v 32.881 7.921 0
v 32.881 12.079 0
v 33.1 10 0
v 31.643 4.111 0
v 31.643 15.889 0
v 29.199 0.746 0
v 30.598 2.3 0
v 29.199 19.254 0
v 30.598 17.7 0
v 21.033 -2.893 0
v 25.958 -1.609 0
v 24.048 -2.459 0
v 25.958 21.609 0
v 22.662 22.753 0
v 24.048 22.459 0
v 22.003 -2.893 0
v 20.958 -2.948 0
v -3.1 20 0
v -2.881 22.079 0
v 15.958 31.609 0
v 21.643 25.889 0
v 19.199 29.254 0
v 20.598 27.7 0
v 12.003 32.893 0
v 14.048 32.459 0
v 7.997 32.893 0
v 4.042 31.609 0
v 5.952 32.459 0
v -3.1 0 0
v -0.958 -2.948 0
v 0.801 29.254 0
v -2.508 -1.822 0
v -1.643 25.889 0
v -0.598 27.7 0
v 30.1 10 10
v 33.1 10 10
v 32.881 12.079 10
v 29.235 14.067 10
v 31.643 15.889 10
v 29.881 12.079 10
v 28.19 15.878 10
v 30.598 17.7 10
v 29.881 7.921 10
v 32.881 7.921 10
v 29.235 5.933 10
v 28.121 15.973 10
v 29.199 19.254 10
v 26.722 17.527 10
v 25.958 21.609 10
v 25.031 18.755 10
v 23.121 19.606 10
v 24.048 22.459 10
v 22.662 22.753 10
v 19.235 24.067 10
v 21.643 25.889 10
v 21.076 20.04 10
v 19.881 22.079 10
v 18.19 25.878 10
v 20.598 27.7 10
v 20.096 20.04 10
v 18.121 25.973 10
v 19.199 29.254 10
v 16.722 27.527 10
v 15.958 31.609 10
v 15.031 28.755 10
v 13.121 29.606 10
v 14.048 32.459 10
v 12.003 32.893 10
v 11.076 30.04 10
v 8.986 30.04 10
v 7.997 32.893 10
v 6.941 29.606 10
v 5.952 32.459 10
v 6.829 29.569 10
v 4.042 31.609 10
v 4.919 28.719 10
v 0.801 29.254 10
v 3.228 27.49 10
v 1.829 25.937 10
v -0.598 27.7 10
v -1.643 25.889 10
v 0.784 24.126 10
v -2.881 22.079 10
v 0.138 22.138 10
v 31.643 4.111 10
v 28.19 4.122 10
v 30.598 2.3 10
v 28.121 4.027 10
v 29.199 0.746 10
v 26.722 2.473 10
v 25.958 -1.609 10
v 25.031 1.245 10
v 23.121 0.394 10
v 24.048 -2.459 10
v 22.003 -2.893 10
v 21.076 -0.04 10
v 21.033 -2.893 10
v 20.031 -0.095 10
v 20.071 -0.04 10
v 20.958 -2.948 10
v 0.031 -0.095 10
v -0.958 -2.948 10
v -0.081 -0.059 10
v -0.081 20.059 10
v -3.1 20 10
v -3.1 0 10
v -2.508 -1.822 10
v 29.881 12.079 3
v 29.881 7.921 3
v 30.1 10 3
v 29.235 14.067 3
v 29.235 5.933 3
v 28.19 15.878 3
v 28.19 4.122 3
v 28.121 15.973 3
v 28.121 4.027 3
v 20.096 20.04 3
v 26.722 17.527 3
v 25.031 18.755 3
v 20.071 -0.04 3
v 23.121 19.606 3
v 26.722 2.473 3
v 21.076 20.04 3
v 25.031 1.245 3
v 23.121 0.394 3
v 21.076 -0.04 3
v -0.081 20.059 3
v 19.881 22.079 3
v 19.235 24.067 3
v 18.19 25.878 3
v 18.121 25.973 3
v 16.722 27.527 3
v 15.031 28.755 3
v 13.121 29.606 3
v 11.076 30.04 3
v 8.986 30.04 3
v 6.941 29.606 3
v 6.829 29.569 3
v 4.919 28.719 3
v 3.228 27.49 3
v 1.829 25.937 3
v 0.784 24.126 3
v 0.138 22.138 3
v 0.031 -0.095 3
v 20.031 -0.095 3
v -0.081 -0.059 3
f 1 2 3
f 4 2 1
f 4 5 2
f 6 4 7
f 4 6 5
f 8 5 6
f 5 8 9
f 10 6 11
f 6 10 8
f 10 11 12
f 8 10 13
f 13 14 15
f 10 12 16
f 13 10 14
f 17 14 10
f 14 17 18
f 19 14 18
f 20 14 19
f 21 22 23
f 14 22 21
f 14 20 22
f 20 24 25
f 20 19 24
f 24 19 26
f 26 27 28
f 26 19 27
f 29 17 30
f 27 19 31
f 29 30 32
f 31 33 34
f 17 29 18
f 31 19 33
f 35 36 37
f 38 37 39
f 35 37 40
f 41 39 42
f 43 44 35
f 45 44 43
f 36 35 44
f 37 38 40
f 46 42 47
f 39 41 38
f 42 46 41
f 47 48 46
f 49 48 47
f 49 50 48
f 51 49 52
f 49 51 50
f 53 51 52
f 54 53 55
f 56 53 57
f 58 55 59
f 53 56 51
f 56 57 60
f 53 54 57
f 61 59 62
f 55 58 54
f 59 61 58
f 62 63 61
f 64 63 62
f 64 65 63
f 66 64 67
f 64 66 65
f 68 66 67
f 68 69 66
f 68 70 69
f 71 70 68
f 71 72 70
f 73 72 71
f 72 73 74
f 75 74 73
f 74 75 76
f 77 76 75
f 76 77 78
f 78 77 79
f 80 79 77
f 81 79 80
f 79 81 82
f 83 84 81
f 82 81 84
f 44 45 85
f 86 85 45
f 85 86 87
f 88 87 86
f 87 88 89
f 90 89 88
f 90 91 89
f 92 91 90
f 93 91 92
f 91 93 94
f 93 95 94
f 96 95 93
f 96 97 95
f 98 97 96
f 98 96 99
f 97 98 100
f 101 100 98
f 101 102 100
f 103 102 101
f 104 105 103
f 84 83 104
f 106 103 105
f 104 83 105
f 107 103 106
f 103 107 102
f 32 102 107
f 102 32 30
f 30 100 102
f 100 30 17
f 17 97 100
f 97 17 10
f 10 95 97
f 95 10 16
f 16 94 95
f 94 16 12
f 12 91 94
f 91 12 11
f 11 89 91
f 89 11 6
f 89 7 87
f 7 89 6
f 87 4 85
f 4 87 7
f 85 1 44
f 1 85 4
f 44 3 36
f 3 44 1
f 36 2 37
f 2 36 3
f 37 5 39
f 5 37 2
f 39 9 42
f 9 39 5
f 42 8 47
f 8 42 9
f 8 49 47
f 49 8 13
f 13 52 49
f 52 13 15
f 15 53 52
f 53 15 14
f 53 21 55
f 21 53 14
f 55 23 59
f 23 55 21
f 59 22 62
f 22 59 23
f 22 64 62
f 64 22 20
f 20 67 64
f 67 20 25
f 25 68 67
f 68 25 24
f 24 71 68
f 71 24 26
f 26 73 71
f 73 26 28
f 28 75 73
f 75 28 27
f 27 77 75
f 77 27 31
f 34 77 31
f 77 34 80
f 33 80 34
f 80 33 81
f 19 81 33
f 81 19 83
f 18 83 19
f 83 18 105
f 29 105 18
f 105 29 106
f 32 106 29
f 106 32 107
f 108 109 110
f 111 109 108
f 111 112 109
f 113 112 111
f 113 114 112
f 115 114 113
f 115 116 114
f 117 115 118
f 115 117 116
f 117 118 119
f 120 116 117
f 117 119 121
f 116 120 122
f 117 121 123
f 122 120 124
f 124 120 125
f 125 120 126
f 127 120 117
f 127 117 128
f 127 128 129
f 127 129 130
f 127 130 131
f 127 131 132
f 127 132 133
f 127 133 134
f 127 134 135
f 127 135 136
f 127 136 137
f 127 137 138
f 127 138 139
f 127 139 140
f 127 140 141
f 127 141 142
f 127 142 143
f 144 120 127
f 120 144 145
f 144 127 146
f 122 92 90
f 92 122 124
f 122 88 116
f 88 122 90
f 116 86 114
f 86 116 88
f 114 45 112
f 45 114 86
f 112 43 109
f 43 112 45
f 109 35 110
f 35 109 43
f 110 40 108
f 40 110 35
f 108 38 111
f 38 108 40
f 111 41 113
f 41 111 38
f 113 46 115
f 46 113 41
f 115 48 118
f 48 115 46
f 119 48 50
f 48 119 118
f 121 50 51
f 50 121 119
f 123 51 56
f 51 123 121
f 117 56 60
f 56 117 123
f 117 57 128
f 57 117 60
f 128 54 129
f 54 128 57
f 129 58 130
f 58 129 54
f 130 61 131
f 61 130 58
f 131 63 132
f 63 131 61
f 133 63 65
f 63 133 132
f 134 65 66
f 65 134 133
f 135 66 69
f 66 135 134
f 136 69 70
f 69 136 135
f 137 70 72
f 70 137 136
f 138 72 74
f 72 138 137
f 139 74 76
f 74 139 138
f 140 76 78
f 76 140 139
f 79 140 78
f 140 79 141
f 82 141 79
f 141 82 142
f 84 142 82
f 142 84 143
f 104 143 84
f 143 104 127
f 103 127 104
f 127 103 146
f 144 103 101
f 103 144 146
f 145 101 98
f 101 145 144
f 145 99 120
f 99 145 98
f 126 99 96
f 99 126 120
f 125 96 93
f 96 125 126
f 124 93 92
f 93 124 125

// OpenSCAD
module heart_shape(size) {
     union() {
        square(size,size);
        translate([size/2,size,0]) circle(size/2);
        translate([size,size/2,0]) circle(size/2);
    }
}

module heart(size,thickness,height) {
   linear_extrude(height=height) 
          minkowski() {
               heart_shape(size);
               circle(thickness+0.1);
        }
}

module heart_box(size,height,thickness) {
    difference() {
         heart(size,thickness,height);
         translate([0,0,thickness])  heart(size,0,height);
    }
}
 
heart_box(20,10,3);
